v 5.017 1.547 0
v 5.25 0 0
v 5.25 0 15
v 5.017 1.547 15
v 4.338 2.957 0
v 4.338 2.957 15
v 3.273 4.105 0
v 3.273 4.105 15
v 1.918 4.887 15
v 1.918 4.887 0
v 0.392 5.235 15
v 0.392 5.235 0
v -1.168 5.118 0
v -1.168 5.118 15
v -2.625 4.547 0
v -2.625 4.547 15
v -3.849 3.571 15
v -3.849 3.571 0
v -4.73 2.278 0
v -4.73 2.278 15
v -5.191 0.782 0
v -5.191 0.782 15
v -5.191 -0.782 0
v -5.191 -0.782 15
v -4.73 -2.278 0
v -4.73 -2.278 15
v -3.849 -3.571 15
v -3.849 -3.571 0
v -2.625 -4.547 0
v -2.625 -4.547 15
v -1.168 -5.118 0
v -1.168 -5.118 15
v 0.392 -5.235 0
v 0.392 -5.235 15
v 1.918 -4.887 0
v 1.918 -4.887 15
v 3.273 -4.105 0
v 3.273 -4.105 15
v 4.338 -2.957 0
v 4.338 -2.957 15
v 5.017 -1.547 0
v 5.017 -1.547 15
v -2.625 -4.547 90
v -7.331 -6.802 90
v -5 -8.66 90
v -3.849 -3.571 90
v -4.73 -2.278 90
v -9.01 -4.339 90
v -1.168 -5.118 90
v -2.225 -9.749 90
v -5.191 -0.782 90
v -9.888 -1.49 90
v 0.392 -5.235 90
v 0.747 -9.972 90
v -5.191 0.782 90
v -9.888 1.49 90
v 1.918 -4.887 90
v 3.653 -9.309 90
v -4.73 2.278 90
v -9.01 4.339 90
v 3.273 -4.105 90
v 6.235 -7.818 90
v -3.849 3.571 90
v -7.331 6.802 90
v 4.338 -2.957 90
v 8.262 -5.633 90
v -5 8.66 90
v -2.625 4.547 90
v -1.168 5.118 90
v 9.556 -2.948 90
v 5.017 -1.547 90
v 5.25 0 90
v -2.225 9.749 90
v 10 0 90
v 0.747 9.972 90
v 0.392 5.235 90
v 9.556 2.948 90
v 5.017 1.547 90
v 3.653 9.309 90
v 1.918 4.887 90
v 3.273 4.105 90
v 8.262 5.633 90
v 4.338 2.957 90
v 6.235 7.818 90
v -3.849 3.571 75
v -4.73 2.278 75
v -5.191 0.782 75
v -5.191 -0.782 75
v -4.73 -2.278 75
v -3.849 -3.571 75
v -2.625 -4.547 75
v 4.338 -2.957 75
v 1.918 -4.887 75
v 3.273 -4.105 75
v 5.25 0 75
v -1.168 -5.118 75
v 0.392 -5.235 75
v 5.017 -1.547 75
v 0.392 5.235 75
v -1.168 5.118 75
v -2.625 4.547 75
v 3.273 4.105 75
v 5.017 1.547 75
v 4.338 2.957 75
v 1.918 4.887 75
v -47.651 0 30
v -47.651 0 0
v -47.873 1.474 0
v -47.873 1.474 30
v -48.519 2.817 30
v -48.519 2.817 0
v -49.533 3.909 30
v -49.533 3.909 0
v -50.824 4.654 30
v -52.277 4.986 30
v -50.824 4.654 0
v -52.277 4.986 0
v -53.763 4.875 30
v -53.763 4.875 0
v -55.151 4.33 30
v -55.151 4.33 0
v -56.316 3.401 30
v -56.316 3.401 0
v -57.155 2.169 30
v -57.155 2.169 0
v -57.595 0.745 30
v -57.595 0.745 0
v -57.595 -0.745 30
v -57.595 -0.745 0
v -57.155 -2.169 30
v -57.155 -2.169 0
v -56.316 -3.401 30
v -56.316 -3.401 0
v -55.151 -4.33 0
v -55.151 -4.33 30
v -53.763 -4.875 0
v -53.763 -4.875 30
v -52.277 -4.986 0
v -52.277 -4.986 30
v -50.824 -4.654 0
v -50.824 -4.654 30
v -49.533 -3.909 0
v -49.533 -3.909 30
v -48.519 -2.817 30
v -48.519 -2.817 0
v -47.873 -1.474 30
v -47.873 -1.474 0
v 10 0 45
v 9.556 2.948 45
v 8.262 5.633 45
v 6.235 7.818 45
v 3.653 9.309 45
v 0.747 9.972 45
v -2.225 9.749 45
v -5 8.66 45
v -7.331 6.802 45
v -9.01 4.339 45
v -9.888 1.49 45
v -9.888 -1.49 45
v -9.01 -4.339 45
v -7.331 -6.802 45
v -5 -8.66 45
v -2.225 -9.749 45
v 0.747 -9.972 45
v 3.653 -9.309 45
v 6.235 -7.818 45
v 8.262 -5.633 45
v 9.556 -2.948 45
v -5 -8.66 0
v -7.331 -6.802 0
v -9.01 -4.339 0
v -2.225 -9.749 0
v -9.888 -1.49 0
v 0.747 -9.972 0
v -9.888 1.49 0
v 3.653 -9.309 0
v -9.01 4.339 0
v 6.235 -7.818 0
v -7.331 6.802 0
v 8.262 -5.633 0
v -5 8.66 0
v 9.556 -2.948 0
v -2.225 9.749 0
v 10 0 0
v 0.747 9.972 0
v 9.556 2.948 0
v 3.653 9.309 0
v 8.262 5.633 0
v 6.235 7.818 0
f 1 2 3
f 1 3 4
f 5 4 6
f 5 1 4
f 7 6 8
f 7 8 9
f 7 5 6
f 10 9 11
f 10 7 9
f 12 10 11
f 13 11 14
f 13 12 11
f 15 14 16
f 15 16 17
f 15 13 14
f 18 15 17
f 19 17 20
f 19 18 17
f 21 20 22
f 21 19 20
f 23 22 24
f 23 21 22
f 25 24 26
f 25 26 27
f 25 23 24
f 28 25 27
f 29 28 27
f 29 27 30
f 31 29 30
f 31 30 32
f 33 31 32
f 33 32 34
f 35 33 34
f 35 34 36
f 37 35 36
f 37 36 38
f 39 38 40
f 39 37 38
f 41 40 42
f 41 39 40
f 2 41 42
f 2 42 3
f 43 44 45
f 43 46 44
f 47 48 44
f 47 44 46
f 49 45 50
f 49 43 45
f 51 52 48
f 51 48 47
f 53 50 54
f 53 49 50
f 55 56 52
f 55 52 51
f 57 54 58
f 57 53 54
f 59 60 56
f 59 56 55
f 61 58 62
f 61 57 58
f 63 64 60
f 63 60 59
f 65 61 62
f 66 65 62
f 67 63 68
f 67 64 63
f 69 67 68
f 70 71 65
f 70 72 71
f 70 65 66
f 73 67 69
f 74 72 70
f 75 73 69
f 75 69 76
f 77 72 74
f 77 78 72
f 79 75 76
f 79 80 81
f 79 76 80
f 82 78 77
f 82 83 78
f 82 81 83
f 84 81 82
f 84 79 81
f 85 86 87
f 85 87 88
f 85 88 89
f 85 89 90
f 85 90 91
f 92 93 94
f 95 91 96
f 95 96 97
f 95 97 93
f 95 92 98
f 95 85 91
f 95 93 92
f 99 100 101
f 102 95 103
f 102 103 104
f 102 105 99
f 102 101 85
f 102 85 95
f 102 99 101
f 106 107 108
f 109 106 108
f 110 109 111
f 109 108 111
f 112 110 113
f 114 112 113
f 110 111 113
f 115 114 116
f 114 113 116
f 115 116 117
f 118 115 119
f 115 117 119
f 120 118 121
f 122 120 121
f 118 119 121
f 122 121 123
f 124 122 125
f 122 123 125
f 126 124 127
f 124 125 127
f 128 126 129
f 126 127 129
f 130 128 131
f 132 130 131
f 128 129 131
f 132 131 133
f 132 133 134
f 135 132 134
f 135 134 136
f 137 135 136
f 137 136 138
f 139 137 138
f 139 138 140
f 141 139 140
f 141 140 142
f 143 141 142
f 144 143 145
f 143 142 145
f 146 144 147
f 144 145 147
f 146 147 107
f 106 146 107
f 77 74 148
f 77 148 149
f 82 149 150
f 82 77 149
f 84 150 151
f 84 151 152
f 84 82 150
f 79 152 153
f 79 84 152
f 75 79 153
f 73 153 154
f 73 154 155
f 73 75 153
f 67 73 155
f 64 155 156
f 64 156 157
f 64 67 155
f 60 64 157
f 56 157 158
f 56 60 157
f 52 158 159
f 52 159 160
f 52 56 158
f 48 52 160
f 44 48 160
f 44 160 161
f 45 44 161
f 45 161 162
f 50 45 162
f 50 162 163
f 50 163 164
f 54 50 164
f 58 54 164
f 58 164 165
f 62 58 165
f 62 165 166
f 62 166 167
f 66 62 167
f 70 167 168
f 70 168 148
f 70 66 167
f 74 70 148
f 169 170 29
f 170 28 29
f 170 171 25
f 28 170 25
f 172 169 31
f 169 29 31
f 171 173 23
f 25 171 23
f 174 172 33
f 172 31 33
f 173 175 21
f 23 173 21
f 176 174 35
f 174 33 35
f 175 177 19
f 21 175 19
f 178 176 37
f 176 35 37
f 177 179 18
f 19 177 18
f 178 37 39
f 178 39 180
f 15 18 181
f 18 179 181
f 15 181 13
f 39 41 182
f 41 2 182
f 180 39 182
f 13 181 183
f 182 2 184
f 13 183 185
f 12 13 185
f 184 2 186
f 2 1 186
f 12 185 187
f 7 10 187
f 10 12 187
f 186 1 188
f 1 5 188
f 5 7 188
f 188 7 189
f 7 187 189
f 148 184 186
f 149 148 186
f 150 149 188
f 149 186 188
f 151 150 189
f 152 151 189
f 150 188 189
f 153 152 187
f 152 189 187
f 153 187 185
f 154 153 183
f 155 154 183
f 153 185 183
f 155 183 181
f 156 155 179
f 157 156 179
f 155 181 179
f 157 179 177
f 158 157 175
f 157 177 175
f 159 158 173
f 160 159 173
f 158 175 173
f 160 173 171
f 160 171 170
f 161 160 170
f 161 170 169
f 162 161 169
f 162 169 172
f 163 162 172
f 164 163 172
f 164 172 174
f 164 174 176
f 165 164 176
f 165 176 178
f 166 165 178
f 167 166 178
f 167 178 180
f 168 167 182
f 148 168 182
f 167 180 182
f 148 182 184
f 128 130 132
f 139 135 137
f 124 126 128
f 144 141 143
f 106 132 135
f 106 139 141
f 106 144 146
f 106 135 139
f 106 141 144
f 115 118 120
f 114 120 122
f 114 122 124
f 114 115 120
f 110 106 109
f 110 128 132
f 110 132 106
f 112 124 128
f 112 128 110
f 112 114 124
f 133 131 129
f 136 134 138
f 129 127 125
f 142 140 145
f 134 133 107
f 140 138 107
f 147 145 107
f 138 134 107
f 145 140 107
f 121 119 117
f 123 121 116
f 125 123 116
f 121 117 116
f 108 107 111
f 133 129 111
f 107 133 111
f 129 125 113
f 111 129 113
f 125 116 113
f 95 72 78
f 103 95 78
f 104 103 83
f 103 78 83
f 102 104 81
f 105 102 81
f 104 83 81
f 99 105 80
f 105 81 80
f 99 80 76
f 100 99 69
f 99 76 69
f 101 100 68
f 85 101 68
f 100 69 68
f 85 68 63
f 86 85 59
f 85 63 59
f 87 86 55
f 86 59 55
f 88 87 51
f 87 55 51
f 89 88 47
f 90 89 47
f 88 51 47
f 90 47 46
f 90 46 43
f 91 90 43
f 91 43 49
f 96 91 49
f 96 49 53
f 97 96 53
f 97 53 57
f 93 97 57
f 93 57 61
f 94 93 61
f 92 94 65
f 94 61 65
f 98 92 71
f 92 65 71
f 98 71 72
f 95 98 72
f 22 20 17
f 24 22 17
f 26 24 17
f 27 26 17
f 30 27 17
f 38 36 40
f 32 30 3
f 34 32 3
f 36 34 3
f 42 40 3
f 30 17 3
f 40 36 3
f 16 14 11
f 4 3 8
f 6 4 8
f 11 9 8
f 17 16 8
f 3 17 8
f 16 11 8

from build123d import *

# Parameters (mm, degrees)
F0_R     = 10
F0_R_2   = 5.25
F1_DEPTH = 45
F2_DEPTH = 15
F4_R     = 5
F5_DEPTH = 30


with BuildPart() as f1:
    # F0 (on Top) → F1 (new body)
    with BuildSketch(Plane.XY):
        Circle(F0_R)
        Circle(F0_R_2, mode=Mode.SUBTRACT)
        Circle(F0_R_2)
    extrude(amount=F1_DEPTH)

    # F0 (on Top) → F2 (cut)
    with BuildSketch(Plane.XY):
        Circle(F0_R_2)
    extrude(amount=F2_DEPTH, mode=Mode.SUBTRACT)

    # F3: F1 across face


with BuildPart() as f1_1:
    add(f1.part)
    add(f1.part.mirror(Plane.XY.offset(45)))


with BuildPart() as f5:
    # F4 (on Top) → F5 (new body)
    with BuildSketch(Plane.XY):
        with Locations((-52.65056, 0)):
            Circle(F4_R)
    extrude(amount=F5_DEPTH)


solid = Compound([f1_1.part, f5.part])
